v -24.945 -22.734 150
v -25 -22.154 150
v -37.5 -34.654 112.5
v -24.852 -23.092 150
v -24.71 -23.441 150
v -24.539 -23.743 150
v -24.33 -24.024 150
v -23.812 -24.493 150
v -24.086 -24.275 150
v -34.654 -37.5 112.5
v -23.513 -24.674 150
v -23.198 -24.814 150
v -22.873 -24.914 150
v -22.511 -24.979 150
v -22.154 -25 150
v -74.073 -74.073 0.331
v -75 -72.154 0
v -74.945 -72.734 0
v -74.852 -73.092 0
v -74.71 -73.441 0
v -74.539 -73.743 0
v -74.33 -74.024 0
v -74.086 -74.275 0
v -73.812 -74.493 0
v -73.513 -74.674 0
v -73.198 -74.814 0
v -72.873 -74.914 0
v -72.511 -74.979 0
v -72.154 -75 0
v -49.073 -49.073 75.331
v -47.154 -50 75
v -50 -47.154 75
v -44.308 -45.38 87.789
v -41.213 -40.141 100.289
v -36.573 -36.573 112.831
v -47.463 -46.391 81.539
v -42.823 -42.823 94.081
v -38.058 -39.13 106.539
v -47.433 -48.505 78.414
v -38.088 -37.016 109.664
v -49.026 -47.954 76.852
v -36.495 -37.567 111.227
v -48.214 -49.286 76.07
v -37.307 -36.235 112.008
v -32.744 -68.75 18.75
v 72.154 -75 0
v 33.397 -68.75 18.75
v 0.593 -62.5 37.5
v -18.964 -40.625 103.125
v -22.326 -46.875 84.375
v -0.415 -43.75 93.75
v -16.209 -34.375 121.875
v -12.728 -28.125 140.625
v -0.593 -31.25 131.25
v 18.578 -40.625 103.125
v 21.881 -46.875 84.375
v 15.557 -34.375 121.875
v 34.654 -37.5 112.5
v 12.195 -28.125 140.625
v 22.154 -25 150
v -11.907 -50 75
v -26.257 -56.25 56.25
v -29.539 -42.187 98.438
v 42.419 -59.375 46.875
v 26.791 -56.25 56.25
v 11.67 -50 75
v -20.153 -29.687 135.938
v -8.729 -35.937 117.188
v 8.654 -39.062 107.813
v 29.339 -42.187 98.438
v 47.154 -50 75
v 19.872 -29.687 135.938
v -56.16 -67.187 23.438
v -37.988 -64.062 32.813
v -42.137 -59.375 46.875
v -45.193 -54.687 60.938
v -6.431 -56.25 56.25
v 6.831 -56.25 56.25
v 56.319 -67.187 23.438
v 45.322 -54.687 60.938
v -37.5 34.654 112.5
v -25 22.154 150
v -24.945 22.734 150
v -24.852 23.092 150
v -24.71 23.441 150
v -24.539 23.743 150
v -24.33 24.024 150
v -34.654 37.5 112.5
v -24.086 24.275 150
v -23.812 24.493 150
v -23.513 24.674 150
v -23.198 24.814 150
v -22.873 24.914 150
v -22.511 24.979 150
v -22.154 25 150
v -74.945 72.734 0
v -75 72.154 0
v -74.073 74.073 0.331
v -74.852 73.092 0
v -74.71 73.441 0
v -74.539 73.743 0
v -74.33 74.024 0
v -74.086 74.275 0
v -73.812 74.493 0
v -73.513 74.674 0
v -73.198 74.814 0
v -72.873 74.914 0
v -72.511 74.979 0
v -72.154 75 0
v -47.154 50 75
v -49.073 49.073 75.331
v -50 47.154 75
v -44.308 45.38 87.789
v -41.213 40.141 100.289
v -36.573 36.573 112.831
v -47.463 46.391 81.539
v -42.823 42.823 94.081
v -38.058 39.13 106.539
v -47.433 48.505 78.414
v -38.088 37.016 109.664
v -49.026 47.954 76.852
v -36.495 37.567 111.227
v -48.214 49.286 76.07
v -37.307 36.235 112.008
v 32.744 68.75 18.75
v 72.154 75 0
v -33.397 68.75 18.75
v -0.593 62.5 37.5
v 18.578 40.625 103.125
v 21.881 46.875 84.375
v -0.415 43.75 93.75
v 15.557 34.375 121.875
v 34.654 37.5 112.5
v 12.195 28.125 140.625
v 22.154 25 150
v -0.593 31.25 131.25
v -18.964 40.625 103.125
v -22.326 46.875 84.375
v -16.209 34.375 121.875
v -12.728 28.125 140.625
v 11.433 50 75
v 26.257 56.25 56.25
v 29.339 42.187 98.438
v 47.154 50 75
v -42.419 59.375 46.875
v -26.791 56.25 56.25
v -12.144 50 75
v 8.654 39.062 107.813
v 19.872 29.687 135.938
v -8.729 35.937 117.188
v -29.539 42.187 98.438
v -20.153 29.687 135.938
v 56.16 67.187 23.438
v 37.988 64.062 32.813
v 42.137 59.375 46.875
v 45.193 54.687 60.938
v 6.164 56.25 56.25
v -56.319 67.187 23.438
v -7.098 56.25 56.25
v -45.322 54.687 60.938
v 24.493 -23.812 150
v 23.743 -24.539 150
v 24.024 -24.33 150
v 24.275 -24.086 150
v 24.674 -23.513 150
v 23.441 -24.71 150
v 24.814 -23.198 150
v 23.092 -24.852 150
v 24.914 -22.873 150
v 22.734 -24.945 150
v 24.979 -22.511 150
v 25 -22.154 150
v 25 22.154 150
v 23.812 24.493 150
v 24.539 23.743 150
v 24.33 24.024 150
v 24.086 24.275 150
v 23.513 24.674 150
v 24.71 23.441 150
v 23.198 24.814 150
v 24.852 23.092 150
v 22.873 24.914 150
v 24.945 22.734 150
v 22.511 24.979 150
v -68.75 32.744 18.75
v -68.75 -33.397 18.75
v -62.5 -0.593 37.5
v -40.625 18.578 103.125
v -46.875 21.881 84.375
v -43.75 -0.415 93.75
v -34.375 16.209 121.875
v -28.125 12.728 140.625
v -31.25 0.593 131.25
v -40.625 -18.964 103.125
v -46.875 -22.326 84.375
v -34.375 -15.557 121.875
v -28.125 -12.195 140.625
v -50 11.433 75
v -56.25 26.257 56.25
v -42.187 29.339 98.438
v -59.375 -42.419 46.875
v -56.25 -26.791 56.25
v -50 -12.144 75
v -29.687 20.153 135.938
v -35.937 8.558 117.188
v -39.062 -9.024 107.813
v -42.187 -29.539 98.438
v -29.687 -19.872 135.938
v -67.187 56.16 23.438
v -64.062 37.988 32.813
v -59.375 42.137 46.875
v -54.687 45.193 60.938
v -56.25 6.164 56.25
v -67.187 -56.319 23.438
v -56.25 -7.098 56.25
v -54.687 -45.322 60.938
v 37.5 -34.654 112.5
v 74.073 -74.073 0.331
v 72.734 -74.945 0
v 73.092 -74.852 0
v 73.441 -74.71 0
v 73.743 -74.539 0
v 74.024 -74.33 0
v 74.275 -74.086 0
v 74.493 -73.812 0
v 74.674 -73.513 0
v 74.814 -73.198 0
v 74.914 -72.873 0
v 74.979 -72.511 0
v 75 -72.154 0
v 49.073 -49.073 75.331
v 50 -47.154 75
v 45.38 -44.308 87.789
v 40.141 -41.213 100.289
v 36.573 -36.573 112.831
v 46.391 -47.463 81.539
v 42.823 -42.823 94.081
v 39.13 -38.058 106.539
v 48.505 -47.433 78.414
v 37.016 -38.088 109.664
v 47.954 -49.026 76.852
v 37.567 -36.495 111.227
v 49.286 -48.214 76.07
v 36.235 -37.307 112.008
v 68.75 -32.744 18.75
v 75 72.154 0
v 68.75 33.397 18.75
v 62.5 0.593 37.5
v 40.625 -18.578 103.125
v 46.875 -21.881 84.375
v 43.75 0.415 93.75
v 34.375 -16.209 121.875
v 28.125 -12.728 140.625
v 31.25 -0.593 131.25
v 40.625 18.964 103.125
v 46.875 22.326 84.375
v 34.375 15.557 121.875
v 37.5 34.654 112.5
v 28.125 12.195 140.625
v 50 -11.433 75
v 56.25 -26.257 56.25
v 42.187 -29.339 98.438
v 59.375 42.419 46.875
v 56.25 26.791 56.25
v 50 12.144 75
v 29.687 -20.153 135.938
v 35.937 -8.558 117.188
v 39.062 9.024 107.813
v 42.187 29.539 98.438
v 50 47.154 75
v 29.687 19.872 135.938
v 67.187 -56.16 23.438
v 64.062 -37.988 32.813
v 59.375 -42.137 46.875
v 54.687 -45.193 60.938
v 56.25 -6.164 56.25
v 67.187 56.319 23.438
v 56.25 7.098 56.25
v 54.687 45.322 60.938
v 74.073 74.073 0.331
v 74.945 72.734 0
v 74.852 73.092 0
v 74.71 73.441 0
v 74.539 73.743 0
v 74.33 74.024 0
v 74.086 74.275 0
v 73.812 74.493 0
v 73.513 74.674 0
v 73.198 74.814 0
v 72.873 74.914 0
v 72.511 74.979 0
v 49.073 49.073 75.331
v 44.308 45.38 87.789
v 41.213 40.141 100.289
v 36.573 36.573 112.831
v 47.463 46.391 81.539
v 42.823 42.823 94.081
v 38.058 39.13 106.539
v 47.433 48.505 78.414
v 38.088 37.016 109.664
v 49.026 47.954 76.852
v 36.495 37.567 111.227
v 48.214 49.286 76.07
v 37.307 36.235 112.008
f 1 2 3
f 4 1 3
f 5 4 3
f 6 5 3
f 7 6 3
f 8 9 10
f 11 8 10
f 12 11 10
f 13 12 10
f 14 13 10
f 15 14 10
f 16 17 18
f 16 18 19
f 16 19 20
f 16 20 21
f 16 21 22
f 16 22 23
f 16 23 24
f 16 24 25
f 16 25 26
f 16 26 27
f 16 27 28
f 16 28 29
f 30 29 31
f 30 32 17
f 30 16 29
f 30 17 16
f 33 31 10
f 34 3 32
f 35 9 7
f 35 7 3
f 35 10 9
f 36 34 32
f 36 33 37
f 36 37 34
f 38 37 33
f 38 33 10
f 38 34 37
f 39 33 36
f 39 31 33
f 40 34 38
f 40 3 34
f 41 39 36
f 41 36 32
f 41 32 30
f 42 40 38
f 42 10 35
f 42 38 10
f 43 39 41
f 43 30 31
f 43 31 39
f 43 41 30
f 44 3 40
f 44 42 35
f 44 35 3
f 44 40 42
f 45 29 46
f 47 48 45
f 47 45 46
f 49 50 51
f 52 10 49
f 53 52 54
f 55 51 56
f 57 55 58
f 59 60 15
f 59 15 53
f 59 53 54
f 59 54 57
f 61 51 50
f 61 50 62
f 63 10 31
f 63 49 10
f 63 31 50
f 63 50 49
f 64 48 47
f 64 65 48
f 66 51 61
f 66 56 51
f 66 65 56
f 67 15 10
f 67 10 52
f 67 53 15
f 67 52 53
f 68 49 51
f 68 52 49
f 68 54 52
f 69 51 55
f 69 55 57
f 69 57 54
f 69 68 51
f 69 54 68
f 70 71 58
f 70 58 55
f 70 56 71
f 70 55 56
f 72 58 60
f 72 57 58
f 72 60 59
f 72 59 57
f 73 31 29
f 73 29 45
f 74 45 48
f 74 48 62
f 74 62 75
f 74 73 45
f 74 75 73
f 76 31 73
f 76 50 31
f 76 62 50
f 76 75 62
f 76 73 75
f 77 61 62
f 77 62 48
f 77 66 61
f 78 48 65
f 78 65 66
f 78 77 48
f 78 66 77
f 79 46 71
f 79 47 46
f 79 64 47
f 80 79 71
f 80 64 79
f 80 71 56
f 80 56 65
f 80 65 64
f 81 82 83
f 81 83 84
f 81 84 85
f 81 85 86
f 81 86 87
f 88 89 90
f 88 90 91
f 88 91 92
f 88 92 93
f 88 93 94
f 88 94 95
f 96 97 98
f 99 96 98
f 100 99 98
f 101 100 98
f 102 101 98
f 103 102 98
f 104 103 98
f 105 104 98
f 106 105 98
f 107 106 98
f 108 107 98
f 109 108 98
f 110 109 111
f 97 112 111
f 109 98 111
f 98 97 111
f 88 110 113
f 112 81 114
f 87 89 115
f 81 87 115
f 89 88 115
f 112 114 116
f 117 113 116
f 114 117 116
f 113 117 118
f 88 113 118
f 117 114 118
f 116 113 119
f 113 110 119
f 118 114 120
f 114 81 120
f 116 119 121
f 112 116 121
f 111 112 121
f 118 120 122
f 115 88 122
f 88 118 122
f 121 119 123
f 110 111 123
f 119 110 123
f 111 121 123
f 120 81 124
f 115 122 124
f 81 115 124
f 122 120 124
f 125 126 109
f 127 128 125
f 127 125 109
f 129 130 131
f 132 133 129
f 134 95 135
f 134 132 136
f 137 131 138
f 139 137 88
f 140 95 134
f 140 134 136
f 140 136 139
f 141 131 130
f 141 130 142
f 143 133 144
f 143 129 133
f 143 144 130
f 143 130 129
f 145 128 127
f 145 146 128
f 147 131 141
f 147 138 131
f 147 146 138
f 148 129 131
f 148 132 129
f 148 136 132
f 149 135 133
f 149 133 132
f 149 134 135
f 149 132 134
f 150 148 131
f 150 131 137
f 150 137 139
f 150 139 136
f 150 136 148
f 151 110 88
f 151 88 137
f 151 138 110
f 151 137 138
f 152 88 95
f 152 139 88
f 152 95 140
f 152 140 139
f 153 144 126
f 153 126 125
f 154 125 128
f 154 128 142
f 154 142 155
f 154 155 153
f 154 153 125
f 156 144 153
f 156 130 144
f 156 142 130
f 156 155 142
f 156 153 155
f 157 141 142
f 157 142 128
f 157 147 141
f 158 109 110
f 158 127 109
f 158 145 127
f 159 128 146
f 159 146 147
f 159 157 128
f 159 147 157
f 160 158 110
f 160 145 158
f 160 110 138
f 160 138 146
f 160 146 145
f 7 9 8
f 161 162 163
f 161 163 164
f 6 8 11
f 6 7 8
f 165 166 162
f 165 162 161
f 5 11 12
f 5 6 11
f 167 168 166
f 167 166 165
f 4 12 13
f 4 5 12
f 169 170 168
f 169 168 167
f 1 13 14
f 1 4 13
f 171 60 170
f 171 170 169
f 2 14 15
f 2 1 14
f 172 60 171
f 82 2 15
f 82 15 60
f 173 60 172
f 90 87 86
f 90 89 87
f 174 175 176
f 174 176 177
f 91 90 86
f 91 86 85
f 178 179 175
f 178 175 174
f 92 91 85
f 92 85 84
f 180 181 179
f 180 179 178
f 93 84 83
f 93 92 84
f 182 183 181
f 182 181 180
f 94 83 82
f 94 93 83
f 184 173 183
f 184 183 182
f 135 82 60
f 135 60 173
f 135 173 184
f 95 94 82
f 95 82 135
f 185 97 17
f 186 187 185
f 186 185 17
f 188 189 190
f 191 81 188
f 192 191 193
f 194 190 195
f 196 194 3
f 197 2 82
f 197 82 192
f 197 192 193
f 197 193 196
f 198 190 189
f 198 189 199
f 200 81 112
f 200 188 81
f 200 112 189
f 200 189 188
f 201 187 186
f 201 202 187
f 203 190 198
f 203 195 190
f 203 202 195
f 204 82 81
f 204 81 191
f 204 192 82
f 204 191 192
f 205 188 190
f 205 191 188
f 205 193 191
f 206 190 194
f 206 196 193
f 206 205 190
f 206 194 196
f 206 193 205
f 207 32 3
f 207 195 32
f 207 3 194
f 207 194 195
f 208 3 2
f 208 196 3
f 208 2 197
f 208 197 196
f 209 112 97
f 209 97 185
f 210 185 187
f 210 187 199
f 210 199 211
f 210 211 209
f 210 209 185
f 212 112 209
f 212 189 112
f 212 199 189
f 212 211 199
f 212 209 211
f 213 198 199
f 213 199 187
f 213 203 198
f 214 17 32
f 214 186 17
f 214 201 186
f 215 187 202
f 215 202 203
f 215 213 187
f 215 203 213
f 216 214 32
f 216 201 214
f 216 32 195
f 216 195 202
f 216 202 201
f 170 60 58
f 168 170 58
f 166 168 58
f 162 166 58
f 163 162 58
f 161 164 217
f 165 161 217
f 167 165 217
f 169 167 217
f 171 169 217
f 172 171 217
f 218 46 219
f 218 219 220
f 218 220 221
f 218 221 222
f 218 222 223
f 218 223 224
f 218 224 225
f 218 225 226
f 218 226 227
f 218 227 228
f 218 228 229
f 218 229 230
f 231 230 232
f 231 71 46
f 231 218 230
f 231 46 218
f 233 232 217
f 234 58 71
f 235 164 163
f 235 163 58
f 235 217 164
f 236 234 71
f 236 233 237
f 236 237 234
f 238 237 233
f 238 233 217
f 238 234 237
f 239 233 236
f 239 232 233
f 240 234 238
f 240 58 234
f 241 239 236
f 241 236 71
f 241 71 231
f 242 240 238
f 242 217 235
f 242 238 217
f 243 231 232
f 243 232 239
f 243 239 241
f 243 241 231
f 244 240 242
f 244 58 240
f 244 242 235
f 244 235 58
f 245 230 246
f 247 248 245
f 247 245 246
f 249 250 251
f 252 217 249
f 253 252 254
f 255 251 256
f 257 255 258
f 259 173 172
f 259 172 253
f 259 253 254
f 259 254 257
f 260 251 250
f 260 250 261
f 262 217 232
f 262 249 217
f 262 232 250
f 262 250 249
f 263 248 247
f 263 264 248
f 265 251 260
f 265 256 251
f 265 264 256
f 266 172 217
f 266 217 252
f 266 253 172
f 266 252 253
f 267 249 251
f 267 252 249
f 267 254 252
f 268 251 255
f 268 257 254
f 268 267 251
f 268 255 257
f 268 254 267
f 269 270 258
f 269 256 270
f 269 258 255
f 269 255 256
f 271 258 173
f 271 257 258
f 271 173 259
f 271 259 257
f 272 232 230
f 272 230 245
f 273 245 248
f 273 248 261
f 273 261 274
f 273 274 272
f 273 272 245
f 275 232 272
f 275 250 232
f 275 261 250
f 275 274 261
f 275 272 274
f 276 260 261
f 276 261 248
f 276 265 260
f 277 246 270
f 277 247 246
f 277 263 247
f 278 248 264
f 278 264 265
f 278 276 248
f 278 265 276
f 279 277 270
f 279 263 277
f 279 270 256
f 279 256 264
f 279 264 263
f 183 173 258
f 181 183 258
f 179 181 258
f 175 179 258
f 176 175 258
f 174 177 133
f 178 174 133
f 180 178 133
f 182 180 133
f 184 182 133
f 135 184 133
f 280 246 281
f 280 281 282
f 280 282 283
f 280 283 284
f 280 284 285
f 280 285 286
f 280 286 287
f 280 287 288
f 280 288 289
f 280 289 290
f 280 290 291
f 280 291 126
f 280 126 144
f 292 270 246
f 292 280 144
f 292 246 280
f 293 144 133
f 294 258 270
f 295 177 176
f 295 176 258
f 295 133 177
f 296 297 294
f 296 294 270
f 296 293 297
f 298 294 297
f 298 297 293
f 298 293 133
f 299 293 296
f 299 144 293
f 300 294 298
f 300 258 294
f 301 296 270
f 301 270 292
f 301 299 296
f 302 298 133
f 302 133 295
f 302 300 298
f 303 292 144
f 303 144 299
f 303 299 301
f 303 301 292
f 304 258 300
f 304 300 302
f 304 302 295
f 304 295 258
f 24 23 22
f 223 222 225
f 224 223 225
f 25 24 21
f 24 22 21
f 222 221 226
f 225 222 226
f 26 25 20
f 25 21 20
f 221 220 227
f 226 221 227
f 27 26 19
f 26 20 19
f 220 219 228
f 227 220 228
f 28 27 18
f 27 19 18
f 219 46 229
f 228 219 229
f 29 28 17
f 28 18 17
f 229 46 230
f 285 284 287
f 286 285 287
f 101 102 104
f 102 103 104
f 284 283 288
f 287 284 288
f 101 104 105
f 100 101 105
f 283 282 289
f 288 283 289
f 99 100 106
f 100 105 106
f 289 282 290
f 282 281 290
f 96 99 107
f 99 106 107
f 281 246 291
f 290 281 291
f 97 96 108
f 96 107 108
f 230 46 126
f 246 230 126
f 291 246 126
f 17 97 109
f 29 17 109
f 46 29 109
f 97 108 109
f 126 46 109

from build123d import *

# Parameters (mm, degrees)
F0_W = 150
F0_H = 150
F2_W = 50
F2_H = 50
F4_R = 3


with BuildPart() as f3:
    # F0 (on Top) → F3 section 0
    with BuildSketch(Plane.XY):
        Rectangle(F0_W, F0_H)
    # F2 (on offset) → F3 section 1
    with BuildSketch(Plane.XY.offset(150)):
        Rectangle(F2_W, F2_H)
    loft()

    # F4
    f4_edges = [f3.edges().sort_by_distance(p)[0] for p in [
        (50, -50, 75),
        (-50, -50, 75),
        (50, 50, 75),
        (-50, 50, 75),
    ]]
    fillet(f4_edges, radius=F4_R)


solid = f3.part
